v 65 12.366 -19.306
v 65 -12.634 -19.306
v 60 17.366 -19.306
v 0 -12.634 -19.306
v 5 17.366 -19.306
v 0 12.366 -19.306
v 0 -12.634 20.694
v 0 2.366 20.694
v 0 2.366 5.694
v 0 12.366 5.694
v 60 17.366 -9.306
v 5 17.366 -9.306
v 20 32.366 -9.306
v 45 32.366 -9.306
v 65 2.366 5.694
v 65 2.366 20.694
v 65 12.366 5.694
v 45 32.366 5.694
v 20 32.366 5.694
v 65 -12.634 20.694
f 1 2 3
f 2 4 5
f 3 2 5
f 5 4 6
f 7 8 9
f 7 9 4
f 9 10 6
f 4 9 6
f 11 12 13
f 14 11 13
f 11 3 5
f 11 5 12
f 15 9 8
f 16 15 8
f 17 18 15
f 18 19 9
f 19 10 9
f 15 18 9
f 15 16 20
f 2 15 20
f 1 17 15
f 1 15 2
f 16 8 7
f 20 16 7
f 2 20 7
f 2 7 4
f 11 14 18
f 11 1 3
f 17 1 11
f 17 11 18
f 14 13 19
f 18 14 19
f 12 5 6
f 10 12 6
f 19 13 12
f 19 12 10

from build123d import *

# Parameters (mm, degrees)
BOSS_EXTRU_1_DEPTH = 65
CHANFREIN4_SIZE    = 20
CHANFREIN5_SIZE    = 20


with BuildPart() as part:
    # Esquisse1 → Boss.-Extru.1 (new body)
    with BuildSketch(Plane(origin=(0, 0, 0), x_dir=(0, 0, -1), z_dir=(1, 0, 0))):
        Polygon((-20.69418762, -12.633516796), (19.30581238, -12.633516796), (19.30581238, 17.366483204), (9.30581238, 17.366483204), (9.30581238, 32.366483204), (-5.69418762, 32.366483204), (-5.69418762, 2.366483204), (-20.69418762, 2.366483204), align=None)
    extrude(amount=BOSS_EXTRU_1_DEPTH)

    # Chanfrein4
    chanfrein4_edges = [part.edges().sort_by_distance(p)[0] for p in [
        (65, 32.366483204, -1.80581238),
    ]]
    chamfer(chanfrein4_edges, length=CHANFREIN4_SIZE)

    # Chanfrein5
    chanfrein5_edges = [part.edges().sort_by_distance(p)[0] for p in [
        (0, 32.366483204, -1.80581238),
    ]]
    chamfer(chanfrein5_edges, length=CHANFREIN5_SIZE)


solid = part.part
